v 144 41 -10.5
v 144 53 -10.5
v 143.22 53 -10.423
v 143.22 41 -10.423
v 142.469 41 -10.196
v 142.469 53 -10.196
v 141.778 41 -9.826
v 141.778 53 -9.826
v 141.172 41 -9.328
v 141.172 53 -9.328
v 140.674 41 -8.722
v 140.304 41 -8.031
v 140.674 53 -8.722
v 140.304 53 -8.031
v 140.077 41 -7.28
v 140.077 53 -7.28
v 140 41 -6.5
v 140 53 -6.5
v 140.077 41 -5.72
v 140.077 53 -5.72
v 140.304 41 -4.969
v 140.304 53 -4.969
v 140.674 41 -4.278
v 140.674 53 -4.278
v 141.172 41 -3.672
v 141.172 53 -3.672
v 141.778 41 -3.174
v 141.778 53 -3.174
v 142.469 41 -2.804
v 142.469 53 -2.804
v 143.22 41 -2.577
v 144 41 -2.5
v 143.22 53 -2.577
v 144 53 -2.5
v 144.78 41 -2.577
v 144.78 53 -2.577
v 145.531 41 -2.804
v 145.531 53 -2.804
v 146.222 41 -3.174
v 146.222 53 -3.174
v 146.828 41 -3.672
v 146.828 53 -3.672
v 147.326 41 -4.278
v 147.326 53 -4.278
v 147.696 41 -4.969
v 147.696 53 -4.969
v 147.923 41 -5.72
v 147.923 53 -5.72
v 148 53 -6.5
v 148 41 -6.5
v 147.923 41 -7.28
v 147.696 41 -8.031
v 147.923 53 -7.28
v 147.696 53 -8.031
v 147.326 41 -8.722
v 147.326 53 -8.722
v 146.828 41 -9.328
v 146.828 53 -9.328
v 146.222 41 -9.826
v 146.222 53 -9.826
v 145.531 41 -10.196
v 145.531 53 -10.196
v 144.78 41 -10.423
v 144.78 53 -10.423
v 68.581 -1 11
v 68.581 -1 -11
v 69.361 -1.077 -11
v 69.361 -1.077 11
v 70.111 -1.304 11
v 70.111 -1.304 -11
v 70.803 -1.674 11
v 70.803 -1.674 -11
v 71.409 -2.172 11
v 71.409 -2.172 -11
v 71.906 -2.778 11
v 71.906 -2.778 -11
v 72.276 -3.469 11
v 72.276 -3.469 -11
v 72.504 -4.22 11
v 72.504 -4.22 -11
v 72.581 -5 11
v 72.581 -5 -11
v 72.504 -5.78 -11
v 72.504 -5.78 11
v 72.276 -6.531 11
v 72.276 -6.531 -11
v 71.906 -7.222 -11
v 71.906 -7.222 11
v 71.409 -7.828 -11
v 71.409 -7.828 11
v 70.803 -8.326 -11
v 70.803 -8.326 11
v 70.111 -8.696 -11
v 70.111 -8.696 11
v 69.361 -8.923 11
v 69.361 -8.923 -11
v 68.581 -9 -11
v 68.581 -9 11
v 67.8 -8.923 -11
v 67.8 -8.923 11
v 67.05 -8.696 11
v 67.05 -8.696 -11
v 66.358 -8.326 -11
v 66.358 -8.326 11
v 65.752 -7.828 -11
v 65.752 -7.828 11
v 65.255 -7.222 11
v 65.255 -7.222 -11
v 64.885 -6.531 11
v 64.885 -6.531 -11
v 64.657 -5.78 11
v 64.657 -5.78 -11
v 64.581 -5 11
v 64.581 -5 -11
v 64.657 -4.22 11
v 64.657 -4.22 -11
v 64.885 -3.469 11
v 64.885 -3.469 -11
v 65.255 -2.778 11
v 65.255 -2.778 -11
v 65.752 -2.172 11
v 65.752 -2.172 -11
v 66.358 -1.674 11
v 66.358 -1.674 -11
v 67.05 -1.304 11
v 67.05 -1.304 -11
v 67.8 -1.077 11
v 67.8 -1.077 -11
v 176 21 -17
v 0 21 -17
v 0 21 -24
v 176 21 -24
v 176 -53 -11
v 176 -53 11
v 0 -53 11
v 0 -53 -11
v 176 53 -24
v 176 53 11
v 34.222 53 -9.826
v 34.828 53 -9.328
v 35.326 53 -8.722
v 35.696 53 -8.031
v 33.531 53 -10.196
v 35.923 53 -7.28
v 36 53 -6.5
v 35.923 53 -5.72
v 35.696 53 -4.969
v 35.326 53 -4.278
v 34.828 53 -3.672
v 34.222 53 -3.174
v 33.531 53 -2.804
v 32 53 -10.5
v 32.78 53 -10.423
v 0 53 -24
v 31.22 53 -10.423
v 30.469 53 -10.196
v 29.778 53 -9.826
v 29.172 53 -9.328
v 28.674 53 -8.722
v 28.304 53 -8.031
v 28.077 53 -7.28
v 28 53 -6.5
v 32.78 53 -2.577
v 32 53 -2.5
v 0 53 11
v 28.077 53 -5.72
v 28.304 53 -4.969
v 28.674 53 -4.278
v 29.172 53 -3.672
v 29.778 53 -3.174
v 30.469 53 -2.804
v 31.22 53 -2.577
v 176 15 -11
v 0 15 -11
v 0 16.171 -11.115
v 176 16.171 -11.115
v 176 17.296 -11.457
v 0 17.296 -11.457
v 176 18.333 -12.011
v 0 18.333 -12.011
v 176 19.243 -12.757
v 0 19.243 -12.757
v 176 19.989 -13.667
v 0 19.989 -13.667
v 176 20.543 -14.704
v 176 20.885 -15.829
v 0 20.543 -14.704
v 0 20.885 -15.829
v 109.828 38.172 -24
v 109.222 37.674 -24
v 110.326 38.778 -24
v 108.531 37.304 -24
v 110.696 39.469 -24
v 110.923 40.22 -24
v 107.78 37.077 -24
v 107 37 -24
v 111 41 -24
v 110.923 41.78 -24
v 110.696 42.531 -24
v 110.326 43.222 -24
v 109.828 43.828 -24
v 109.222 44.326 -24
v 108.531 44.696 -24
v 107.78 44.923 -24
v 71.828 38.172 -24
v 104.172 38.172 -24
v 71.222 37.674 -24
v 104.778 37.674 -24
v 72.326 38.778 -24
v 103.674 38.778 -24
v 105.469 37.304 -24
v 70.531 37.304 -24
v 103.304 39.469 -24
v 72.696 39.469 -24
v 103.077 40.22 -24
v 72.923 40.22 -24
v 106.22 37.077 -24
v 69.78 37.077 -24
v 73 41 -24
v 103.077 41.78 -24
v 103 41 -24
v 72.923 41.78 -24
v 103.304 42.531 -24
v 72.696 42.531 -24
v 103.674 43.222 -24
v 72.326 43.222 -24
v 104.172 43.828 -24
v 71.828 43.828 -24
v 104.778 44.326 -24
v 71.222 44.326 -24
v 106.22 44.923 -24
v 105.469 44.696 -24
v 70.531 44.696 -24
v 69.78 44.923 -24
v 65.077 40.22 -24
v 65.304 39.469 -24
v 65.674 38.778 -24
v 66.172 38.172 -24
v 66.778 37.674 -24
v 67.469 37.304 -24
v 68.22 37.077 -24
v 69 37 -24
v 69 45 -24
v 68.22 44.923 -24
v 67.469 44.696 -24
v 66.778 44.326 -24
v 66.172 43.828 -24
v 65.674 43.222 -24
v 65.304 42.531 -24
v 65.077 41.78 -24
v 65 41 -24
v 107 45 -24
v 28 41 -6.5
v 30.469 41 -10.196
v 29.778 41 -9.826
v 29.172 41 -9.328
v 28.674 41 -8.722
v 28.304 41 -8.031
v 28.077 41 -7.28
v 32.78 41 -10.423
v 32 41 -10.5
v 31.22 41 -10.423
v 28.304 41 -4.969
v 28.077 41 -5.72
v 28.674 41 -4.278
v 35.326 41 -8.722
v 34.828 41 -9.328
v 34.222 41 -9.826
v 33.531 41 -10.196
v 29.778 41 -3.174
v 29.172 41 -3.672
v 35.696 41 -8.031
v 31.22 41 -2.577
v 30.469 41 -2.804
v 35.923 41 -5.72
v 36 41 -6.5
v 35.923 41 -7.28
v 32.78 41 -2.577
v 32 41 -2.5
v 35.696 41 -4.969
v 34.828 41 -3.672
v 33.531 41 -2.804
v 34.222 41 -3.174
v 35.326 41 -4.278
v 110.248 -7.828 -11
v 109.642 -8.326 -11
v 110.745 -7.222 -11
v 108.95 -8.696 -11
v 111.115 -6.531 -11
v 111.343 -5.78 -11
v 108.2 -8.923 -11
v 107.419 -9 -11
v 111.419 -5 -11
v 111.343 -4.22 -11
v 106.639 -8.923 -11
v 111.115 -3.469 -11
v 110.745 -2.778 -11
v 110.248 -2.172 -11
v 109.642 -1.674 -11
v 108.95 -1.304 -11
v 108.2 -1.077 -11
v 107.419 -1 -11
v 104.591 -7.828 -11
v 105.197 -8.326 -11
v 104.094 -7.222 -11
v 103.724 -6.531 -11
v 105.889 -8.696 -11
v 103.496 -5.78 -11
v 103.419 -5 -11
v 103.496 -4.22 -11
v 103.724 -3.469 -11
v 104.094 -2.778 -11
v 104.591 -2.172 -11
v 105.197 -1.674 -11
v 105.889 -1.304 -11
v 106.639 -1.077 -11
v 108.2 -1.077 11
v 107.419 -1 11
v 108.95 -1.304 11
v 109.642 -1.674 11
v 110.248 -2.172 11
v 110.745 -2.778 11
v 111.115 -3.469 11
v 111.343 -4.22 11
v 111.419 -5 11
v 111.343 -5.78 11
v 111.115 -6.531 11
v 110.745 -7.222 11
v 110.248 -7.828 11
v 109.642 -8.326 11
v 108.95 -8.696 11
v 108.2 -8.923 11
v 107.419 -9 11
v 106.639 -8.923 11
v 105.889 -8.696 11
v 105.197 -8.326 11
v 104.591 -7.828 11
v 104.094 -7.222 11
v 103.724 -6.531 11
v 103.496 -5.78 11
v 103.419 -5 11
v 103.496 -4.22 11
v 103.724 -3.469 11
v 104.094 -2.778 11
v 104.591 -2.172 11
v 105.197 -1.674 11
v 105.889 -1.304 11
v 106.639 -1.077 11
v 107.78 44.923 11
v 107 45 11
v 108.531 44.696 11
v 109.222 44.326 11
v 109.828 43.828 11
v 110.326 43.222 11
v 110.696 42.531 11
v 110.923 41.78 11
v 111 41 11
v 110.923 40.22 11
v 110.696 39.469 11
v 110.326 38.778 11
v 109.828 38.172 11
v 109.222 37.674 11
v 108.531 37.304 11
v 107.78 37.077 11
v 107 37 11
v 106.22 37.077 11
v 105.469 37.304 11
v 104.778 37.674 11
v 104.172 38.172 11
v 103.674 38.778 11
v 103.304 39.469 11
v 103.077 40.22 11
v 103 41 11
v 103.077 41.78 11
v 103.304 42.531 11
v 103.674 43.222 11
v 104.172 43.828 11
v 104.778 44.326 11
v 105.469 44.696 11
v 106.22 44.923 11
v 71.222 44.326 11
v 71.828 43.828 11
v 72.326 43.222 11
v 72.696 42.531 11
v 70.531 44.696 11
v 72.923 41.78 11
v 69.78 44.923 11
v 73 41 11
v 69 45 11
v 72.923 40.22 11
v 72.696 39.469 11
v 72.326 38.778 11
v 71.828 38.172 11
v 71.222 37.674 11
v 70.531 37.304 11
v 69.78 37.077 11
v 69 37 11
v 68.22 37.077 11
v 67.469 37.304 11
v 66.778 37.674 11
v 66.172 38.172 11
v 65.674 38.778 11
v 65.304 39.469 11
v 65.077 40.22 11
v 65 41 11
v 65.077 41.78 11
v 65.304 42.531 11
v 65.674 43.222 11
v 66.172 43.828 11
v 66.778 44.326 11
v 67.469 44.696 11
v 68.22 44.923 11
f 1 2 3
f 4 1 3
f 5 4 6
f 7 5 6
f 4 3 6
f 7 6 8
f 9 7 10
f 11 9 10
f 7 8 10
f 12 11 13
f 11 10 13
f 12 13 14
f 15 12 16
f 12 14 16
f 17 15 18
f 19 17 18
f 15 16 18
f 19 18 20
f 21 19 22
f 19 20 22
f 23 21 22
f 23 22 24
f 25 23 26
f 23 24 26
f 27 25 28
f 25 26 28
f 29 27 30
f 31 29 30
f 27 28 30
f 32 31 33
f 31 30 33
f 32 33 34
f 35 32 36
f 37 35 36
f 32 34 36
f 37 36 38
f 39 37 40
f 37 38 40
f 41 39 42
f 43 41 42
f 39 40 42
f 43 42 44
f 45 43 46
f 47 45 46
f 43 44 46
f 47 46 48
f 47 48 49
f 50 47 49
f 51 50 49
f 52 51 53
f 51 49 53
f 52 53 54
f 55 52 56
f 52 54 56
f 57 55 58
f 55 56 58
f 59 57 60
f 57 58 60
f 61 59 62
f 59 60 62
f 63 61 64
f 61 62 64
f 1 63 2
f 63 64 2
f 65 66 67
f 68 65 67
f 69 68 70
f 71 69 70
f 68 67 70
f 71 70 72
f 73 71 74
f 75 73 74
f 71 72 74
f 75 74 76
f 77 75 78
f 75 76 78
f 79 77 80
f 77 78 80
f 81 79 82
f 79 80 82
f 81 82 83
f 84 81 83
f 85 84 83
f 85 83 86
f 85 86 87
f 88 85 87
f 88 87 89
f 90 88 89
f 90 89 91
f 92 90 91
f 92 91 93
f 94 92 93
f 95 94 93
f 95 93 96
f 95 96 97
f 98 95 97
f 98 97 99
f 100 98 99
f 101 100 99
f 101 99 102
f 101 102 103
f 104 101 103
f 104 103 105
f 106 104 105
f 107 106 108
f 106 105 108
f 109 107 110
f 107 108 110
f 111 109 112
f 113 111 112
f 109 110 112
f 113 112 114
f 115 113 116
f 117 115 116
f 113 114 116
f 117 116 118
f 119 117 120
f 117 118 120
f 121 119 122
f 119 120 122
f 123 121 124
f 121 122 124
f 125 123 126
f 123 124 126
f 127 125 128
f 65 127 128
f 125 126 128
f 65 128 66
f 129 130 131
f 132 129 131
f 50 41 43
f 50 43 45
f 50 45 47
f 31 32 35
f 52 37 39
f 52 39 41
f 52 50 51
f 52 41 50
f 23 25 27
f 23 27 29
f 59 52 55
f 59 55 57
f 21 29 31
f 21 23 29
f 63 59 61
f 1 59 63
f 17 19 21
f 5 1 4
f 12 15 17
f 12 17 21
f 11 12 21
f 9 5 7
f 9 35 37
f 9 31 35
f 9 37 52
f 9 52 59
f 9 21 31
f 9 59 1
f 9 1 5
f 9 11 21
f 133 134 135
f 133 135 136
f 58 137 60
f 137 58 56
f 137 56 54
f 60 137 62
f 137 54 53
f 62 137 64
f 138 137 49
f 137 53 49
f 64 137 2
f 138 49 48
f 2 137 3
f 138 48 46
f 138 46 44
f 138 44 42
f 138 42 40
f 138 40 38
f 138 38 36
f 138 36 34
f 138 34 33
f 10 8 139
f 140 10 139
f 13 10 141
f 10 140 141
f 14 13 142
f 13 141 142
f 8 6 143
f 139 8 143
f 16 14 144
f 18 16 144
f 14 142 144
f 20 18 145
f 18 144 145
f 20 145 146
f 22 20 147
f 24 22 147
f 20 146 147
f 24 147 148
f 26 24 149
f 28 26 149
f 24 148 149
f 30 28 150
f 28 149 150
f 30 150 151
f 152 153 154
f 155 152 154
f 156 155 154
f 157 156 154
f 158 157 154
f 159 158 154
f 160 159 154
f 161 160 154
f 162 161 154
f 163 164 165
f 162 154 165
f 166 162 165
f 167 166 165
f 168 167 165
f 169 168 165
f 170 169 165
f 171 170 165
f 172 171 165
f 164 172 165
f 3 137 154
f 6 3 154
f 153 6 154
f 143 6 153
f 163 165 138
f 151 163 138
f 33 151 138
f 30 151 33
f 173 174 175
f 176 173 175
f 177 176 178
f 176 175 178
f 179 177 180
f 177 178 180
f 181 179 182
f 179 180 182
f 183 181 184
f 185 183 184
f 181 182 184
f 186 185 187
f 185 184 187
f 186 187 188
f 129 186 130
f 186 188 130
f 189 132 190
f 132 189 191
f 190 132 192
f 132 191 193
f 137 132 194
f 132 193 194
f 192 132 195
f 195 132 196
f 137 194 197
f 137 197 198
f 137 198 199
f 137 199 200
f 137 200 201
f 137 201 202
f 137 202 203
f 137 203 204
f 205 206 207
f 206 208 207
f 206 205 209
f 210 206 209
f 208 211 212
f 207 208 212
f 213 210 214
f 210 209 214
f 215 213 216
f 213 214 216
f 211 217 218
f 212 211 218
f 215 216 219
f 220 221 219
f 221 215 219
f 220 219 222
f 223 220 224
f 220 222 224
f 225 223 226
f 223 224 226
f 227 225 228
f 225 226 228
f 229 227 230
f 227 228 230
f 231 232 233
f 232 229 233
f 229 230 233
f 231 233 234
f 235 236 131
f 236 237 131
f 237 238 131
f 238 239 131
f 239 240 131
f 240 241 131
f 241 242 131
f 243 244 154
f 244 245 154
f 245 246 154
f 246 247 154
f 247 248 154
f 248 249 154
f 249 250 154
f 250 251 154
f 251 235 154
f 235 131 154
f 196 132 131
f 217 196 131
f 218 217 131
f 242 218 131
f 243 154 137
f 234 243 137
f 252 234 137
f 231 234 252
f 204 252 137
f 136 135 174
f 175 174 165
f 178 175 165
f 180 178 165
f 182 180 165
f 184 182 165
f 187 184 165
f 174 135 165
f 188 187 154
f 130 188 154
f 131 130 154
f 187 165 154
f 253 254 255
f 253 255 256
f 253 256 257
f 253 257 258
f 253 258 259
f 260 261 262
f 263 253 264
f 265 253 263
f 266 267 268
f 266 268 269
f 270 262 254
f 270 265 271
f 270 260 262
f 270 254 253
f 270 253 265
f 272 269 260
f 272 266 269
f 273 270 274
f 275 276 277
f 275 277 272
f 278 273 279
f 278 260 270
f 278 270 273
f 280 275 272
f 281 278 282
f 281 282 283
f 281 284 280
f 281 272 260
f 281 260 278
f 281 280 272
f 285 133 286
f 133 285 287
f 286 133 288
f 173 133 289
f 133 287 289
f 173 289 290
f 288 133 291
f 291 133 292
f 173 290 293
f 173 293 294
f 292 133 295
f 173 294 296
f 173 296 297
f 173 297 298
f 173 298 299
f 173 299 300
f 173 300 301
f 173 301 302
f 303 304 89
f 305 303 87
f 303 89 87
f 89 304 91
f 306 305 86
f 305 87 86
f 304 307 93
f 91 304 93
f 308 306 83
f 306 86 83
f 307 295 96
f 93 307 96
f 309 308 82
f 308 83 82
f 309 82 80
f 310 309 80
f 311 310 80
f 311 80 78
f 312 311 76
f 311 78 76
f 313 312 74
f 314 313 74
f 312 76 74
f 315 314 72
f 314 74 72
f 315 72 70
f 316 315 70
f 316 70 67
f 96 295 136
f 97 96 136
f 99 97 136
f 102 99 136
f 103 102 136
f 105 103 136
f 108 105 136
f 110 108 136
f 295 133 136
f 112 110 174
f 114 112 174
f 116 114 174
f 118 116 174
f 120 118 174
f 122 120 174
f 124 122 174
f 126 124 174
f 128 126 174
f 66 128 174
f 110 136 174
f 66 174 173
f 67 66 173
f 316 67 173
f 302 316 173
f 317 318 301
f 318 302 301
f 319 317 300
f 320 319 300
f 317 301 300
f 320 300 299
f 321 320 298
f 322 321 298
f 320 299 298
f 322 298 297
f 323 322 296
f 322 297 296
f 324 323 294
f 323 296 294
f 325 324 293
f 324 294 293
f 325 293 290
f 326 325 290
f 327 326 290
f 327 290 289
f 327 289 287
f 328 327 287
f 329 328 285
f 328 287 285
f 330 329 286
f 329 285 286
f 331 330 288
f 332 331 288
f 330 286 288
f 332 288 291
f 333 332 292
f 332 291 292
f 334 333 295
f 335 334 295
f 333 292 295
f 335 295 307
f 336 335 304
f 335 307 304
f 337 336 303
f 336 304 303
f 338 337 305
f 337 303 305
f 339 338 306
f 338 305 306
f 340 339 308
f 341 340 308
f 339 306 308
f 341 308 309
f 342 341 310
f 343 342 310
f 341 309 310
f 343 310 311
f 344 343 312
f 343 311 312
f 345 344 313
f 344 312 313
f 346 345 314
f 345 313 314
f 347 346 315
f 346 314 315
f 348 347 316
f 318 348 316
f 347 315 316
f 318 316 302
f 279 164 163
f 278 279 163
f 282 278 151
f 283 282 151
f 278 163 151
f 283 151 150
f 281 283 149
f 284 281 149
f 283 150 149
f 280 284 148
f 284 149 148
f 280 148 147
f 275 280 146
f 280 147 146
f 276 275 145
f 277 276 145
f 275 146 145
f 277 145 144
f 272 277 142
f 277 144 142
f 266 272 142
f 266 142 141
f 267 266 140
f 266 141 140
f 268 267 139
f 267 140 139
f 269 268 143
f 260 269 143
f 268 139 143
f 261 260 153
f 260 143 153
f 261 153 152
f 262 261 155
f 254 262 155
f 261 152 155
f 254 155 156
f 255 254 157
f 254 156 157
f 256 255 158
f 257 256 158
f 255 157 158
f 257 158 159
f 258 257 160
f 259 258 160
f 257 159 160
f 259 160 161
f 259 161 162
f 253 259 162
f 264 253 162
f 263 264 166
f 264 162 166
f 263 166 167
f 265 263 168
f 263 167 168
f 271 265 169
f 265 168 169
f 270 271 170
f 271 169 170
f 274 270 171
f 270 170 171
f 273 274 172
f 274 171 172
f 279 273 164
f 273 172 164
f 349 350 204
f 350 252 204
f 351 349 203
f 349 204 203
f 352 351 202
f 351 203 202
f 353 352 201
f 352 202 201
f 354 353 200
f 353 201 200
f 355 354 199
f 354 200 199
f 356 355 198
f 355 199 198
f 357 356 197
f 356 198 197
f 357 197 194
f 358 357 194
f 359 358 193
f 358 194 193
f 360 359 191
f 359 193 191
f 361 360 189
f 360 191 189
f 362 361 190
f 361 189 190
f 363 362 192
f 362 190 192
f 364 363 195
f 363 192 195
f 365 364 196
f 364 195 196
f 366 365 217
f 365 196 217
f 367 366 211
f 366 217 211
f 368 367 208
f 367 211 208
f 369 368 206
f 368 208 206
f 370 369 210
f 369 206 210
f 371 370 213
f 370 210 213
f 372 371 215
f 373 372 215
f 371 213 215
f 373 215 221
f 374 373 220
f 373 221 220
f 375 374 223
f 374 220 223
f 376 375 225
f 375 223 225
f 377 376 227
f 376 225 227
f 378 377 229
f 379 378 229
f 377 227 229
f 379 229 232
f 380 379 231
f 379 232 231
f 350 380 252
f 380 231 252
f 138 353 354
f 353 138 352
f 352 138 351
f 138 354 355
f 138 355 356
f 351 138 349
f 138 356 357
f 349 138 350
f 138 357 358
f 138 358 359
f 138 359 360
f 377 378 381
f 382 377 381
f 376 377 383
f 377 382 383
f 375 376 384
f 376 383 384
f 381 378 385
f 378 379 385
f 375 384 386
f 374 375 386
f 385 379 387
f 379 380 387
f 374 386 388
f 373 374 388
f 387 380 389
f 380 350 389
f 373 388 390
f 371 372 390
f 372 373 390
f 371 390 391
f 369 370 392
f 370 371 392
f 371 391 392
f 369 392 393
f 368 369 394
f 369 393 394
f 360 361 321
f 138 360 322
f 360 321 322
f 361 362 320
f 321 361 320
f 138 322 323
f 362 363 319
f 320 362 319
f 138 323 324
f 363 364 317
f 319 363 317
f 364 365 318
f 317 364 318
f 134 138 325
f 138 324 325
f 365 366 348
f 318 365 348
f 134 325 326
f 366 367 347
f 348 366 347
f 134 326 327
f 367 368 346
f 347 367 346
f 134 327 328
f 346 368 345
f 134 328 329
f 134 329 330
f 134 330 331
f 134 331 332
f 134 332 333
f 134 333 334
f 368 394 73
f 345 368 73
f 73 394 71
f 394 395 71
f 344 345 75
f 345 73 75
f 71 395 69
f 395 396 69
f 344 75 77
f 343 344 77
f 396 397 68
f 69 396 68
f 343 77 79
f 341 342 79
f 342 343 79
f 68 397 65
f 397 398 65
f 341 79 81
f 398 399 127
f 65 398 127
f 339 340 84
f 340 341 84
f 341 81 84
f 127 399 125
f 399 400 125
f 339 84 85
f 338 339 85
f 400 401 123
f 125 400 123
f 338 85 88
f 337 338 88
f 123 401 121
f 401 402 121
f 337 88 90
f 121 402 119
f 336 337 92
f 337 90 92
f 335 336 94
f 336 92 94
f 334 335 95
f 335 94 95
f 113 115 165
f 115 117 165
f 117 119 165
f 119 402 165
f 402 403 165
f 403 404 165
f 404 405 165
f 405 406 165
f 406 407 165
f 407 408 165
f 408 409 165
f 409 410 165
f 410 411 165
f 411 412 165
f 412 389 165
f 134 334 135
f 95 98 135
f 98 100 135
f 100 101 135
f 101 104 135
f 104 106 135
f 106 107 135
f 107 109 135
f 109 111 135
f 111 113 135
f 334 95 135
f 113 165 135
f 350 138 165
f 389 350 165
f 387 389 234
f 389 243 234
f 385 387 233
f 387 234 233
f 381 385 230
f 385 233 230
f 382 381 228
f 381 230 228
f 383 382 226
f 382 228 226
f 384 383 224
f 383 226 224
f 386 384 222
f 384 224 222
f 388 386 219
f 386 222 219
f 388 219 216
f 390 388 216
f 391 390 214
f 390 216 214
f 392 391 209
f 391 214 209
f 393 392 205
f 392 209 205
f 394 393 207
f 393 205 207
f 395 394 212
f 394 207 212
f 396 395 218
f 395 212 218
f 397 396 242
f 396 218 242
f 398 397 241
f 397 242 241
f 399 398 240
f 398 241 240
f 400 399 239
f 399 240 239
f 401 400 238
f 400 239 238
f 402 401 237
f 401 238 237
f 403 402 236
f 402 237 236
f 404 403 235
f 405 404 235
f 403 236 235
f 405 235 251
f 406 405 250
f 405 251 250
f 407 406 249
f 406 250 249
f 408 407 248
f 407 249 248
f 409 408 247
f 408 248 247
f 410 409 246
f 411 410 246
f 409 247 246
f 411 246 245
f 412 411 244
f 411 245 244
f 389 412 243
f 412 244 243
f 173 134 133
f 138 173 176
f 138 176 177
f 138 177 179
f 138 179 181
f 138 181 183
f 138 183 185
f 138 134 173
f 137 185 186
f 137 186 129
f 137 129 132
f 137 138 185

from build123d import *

# Parameters (mm, degrees)
BOSS_EXTRUDE1_DEPTH = 176
SKETCH2_R           = 4
CUT_EXTRUDE1_DEPTH  = 90
SKETCH3_R           = 4
CUT_EXTRUDE2_DEPTH  = 12


with BuildPart() as part:
    # Sketch1 → Boss-Extrude1 (new body)
    with BuildSketch(Plane(origin=(0, 0, 0), x_dir=(0, 0, -1), z_dir=(1, 0, 0))):
        with BuildLine():
            Line((11, 53), (-11, 53))
            Line((-11, 53), (-11, -53))
            Line((-11, -53), (11, -53))
            Line((11, -53), (11, 15))
            ThreePointArc((11, 15), (12.757359313, 19.242640687), (17, 21))
            Line((17, 21), (24, 21))
            Line((24, 21), (24, 53))
            Line((24, 53), (11, 53))
        make_face()
    extrude(amount=BOSS_EXTRUDE1_DEPTH)

    # Sketch2 → Cut-Extrude1 (cut, symmetric)
    with BuildSketch(Plane(origin=(0, 0, -11), x_dir=(-1, 0, 0), z_dir=(0, 0, -1))):
        with Locations(Location((-69, 41, 0), (0, 0, 90))):
            Circle(SKETCH2_R)
        with Locations(Location((-107, 41, 0), (0, 0, 90))):
            Circle(SKETCH2_R)
        with Locations(Location((-68.580611035, -5, 0), (0, 0, 90))):
            Circle(SKETCH2_R)
        with Locations(Location((-107.419388965, -5, 0), (0, 0, 90))):
            Circle(SKETCH2_R)
    extrude(amount=CUT_EXTRUDE1_DEPTH, both=True, mode=Mode.SUBTRACT)

    # Sketch3 → Cut-Extrude2 (cut)
    with BuildSketch(Plane(origin=(0, 53, 0), x_dir=(1, 0, 0), z_dir=(0, 1, 0))):
        with Locations(Location((32, 6.5, 0), (0, 0, 270))):
            Circle(SKETCH3_R)
        with Locations(Location((144, 6.5, 0), (0, 0, 90))):
            Circle(SKETCH3_R)
    extrude(amount=-CUT_EXTRUDE2_DEPTH, mode=Mode.SUBTRACT)


solid = part.part
